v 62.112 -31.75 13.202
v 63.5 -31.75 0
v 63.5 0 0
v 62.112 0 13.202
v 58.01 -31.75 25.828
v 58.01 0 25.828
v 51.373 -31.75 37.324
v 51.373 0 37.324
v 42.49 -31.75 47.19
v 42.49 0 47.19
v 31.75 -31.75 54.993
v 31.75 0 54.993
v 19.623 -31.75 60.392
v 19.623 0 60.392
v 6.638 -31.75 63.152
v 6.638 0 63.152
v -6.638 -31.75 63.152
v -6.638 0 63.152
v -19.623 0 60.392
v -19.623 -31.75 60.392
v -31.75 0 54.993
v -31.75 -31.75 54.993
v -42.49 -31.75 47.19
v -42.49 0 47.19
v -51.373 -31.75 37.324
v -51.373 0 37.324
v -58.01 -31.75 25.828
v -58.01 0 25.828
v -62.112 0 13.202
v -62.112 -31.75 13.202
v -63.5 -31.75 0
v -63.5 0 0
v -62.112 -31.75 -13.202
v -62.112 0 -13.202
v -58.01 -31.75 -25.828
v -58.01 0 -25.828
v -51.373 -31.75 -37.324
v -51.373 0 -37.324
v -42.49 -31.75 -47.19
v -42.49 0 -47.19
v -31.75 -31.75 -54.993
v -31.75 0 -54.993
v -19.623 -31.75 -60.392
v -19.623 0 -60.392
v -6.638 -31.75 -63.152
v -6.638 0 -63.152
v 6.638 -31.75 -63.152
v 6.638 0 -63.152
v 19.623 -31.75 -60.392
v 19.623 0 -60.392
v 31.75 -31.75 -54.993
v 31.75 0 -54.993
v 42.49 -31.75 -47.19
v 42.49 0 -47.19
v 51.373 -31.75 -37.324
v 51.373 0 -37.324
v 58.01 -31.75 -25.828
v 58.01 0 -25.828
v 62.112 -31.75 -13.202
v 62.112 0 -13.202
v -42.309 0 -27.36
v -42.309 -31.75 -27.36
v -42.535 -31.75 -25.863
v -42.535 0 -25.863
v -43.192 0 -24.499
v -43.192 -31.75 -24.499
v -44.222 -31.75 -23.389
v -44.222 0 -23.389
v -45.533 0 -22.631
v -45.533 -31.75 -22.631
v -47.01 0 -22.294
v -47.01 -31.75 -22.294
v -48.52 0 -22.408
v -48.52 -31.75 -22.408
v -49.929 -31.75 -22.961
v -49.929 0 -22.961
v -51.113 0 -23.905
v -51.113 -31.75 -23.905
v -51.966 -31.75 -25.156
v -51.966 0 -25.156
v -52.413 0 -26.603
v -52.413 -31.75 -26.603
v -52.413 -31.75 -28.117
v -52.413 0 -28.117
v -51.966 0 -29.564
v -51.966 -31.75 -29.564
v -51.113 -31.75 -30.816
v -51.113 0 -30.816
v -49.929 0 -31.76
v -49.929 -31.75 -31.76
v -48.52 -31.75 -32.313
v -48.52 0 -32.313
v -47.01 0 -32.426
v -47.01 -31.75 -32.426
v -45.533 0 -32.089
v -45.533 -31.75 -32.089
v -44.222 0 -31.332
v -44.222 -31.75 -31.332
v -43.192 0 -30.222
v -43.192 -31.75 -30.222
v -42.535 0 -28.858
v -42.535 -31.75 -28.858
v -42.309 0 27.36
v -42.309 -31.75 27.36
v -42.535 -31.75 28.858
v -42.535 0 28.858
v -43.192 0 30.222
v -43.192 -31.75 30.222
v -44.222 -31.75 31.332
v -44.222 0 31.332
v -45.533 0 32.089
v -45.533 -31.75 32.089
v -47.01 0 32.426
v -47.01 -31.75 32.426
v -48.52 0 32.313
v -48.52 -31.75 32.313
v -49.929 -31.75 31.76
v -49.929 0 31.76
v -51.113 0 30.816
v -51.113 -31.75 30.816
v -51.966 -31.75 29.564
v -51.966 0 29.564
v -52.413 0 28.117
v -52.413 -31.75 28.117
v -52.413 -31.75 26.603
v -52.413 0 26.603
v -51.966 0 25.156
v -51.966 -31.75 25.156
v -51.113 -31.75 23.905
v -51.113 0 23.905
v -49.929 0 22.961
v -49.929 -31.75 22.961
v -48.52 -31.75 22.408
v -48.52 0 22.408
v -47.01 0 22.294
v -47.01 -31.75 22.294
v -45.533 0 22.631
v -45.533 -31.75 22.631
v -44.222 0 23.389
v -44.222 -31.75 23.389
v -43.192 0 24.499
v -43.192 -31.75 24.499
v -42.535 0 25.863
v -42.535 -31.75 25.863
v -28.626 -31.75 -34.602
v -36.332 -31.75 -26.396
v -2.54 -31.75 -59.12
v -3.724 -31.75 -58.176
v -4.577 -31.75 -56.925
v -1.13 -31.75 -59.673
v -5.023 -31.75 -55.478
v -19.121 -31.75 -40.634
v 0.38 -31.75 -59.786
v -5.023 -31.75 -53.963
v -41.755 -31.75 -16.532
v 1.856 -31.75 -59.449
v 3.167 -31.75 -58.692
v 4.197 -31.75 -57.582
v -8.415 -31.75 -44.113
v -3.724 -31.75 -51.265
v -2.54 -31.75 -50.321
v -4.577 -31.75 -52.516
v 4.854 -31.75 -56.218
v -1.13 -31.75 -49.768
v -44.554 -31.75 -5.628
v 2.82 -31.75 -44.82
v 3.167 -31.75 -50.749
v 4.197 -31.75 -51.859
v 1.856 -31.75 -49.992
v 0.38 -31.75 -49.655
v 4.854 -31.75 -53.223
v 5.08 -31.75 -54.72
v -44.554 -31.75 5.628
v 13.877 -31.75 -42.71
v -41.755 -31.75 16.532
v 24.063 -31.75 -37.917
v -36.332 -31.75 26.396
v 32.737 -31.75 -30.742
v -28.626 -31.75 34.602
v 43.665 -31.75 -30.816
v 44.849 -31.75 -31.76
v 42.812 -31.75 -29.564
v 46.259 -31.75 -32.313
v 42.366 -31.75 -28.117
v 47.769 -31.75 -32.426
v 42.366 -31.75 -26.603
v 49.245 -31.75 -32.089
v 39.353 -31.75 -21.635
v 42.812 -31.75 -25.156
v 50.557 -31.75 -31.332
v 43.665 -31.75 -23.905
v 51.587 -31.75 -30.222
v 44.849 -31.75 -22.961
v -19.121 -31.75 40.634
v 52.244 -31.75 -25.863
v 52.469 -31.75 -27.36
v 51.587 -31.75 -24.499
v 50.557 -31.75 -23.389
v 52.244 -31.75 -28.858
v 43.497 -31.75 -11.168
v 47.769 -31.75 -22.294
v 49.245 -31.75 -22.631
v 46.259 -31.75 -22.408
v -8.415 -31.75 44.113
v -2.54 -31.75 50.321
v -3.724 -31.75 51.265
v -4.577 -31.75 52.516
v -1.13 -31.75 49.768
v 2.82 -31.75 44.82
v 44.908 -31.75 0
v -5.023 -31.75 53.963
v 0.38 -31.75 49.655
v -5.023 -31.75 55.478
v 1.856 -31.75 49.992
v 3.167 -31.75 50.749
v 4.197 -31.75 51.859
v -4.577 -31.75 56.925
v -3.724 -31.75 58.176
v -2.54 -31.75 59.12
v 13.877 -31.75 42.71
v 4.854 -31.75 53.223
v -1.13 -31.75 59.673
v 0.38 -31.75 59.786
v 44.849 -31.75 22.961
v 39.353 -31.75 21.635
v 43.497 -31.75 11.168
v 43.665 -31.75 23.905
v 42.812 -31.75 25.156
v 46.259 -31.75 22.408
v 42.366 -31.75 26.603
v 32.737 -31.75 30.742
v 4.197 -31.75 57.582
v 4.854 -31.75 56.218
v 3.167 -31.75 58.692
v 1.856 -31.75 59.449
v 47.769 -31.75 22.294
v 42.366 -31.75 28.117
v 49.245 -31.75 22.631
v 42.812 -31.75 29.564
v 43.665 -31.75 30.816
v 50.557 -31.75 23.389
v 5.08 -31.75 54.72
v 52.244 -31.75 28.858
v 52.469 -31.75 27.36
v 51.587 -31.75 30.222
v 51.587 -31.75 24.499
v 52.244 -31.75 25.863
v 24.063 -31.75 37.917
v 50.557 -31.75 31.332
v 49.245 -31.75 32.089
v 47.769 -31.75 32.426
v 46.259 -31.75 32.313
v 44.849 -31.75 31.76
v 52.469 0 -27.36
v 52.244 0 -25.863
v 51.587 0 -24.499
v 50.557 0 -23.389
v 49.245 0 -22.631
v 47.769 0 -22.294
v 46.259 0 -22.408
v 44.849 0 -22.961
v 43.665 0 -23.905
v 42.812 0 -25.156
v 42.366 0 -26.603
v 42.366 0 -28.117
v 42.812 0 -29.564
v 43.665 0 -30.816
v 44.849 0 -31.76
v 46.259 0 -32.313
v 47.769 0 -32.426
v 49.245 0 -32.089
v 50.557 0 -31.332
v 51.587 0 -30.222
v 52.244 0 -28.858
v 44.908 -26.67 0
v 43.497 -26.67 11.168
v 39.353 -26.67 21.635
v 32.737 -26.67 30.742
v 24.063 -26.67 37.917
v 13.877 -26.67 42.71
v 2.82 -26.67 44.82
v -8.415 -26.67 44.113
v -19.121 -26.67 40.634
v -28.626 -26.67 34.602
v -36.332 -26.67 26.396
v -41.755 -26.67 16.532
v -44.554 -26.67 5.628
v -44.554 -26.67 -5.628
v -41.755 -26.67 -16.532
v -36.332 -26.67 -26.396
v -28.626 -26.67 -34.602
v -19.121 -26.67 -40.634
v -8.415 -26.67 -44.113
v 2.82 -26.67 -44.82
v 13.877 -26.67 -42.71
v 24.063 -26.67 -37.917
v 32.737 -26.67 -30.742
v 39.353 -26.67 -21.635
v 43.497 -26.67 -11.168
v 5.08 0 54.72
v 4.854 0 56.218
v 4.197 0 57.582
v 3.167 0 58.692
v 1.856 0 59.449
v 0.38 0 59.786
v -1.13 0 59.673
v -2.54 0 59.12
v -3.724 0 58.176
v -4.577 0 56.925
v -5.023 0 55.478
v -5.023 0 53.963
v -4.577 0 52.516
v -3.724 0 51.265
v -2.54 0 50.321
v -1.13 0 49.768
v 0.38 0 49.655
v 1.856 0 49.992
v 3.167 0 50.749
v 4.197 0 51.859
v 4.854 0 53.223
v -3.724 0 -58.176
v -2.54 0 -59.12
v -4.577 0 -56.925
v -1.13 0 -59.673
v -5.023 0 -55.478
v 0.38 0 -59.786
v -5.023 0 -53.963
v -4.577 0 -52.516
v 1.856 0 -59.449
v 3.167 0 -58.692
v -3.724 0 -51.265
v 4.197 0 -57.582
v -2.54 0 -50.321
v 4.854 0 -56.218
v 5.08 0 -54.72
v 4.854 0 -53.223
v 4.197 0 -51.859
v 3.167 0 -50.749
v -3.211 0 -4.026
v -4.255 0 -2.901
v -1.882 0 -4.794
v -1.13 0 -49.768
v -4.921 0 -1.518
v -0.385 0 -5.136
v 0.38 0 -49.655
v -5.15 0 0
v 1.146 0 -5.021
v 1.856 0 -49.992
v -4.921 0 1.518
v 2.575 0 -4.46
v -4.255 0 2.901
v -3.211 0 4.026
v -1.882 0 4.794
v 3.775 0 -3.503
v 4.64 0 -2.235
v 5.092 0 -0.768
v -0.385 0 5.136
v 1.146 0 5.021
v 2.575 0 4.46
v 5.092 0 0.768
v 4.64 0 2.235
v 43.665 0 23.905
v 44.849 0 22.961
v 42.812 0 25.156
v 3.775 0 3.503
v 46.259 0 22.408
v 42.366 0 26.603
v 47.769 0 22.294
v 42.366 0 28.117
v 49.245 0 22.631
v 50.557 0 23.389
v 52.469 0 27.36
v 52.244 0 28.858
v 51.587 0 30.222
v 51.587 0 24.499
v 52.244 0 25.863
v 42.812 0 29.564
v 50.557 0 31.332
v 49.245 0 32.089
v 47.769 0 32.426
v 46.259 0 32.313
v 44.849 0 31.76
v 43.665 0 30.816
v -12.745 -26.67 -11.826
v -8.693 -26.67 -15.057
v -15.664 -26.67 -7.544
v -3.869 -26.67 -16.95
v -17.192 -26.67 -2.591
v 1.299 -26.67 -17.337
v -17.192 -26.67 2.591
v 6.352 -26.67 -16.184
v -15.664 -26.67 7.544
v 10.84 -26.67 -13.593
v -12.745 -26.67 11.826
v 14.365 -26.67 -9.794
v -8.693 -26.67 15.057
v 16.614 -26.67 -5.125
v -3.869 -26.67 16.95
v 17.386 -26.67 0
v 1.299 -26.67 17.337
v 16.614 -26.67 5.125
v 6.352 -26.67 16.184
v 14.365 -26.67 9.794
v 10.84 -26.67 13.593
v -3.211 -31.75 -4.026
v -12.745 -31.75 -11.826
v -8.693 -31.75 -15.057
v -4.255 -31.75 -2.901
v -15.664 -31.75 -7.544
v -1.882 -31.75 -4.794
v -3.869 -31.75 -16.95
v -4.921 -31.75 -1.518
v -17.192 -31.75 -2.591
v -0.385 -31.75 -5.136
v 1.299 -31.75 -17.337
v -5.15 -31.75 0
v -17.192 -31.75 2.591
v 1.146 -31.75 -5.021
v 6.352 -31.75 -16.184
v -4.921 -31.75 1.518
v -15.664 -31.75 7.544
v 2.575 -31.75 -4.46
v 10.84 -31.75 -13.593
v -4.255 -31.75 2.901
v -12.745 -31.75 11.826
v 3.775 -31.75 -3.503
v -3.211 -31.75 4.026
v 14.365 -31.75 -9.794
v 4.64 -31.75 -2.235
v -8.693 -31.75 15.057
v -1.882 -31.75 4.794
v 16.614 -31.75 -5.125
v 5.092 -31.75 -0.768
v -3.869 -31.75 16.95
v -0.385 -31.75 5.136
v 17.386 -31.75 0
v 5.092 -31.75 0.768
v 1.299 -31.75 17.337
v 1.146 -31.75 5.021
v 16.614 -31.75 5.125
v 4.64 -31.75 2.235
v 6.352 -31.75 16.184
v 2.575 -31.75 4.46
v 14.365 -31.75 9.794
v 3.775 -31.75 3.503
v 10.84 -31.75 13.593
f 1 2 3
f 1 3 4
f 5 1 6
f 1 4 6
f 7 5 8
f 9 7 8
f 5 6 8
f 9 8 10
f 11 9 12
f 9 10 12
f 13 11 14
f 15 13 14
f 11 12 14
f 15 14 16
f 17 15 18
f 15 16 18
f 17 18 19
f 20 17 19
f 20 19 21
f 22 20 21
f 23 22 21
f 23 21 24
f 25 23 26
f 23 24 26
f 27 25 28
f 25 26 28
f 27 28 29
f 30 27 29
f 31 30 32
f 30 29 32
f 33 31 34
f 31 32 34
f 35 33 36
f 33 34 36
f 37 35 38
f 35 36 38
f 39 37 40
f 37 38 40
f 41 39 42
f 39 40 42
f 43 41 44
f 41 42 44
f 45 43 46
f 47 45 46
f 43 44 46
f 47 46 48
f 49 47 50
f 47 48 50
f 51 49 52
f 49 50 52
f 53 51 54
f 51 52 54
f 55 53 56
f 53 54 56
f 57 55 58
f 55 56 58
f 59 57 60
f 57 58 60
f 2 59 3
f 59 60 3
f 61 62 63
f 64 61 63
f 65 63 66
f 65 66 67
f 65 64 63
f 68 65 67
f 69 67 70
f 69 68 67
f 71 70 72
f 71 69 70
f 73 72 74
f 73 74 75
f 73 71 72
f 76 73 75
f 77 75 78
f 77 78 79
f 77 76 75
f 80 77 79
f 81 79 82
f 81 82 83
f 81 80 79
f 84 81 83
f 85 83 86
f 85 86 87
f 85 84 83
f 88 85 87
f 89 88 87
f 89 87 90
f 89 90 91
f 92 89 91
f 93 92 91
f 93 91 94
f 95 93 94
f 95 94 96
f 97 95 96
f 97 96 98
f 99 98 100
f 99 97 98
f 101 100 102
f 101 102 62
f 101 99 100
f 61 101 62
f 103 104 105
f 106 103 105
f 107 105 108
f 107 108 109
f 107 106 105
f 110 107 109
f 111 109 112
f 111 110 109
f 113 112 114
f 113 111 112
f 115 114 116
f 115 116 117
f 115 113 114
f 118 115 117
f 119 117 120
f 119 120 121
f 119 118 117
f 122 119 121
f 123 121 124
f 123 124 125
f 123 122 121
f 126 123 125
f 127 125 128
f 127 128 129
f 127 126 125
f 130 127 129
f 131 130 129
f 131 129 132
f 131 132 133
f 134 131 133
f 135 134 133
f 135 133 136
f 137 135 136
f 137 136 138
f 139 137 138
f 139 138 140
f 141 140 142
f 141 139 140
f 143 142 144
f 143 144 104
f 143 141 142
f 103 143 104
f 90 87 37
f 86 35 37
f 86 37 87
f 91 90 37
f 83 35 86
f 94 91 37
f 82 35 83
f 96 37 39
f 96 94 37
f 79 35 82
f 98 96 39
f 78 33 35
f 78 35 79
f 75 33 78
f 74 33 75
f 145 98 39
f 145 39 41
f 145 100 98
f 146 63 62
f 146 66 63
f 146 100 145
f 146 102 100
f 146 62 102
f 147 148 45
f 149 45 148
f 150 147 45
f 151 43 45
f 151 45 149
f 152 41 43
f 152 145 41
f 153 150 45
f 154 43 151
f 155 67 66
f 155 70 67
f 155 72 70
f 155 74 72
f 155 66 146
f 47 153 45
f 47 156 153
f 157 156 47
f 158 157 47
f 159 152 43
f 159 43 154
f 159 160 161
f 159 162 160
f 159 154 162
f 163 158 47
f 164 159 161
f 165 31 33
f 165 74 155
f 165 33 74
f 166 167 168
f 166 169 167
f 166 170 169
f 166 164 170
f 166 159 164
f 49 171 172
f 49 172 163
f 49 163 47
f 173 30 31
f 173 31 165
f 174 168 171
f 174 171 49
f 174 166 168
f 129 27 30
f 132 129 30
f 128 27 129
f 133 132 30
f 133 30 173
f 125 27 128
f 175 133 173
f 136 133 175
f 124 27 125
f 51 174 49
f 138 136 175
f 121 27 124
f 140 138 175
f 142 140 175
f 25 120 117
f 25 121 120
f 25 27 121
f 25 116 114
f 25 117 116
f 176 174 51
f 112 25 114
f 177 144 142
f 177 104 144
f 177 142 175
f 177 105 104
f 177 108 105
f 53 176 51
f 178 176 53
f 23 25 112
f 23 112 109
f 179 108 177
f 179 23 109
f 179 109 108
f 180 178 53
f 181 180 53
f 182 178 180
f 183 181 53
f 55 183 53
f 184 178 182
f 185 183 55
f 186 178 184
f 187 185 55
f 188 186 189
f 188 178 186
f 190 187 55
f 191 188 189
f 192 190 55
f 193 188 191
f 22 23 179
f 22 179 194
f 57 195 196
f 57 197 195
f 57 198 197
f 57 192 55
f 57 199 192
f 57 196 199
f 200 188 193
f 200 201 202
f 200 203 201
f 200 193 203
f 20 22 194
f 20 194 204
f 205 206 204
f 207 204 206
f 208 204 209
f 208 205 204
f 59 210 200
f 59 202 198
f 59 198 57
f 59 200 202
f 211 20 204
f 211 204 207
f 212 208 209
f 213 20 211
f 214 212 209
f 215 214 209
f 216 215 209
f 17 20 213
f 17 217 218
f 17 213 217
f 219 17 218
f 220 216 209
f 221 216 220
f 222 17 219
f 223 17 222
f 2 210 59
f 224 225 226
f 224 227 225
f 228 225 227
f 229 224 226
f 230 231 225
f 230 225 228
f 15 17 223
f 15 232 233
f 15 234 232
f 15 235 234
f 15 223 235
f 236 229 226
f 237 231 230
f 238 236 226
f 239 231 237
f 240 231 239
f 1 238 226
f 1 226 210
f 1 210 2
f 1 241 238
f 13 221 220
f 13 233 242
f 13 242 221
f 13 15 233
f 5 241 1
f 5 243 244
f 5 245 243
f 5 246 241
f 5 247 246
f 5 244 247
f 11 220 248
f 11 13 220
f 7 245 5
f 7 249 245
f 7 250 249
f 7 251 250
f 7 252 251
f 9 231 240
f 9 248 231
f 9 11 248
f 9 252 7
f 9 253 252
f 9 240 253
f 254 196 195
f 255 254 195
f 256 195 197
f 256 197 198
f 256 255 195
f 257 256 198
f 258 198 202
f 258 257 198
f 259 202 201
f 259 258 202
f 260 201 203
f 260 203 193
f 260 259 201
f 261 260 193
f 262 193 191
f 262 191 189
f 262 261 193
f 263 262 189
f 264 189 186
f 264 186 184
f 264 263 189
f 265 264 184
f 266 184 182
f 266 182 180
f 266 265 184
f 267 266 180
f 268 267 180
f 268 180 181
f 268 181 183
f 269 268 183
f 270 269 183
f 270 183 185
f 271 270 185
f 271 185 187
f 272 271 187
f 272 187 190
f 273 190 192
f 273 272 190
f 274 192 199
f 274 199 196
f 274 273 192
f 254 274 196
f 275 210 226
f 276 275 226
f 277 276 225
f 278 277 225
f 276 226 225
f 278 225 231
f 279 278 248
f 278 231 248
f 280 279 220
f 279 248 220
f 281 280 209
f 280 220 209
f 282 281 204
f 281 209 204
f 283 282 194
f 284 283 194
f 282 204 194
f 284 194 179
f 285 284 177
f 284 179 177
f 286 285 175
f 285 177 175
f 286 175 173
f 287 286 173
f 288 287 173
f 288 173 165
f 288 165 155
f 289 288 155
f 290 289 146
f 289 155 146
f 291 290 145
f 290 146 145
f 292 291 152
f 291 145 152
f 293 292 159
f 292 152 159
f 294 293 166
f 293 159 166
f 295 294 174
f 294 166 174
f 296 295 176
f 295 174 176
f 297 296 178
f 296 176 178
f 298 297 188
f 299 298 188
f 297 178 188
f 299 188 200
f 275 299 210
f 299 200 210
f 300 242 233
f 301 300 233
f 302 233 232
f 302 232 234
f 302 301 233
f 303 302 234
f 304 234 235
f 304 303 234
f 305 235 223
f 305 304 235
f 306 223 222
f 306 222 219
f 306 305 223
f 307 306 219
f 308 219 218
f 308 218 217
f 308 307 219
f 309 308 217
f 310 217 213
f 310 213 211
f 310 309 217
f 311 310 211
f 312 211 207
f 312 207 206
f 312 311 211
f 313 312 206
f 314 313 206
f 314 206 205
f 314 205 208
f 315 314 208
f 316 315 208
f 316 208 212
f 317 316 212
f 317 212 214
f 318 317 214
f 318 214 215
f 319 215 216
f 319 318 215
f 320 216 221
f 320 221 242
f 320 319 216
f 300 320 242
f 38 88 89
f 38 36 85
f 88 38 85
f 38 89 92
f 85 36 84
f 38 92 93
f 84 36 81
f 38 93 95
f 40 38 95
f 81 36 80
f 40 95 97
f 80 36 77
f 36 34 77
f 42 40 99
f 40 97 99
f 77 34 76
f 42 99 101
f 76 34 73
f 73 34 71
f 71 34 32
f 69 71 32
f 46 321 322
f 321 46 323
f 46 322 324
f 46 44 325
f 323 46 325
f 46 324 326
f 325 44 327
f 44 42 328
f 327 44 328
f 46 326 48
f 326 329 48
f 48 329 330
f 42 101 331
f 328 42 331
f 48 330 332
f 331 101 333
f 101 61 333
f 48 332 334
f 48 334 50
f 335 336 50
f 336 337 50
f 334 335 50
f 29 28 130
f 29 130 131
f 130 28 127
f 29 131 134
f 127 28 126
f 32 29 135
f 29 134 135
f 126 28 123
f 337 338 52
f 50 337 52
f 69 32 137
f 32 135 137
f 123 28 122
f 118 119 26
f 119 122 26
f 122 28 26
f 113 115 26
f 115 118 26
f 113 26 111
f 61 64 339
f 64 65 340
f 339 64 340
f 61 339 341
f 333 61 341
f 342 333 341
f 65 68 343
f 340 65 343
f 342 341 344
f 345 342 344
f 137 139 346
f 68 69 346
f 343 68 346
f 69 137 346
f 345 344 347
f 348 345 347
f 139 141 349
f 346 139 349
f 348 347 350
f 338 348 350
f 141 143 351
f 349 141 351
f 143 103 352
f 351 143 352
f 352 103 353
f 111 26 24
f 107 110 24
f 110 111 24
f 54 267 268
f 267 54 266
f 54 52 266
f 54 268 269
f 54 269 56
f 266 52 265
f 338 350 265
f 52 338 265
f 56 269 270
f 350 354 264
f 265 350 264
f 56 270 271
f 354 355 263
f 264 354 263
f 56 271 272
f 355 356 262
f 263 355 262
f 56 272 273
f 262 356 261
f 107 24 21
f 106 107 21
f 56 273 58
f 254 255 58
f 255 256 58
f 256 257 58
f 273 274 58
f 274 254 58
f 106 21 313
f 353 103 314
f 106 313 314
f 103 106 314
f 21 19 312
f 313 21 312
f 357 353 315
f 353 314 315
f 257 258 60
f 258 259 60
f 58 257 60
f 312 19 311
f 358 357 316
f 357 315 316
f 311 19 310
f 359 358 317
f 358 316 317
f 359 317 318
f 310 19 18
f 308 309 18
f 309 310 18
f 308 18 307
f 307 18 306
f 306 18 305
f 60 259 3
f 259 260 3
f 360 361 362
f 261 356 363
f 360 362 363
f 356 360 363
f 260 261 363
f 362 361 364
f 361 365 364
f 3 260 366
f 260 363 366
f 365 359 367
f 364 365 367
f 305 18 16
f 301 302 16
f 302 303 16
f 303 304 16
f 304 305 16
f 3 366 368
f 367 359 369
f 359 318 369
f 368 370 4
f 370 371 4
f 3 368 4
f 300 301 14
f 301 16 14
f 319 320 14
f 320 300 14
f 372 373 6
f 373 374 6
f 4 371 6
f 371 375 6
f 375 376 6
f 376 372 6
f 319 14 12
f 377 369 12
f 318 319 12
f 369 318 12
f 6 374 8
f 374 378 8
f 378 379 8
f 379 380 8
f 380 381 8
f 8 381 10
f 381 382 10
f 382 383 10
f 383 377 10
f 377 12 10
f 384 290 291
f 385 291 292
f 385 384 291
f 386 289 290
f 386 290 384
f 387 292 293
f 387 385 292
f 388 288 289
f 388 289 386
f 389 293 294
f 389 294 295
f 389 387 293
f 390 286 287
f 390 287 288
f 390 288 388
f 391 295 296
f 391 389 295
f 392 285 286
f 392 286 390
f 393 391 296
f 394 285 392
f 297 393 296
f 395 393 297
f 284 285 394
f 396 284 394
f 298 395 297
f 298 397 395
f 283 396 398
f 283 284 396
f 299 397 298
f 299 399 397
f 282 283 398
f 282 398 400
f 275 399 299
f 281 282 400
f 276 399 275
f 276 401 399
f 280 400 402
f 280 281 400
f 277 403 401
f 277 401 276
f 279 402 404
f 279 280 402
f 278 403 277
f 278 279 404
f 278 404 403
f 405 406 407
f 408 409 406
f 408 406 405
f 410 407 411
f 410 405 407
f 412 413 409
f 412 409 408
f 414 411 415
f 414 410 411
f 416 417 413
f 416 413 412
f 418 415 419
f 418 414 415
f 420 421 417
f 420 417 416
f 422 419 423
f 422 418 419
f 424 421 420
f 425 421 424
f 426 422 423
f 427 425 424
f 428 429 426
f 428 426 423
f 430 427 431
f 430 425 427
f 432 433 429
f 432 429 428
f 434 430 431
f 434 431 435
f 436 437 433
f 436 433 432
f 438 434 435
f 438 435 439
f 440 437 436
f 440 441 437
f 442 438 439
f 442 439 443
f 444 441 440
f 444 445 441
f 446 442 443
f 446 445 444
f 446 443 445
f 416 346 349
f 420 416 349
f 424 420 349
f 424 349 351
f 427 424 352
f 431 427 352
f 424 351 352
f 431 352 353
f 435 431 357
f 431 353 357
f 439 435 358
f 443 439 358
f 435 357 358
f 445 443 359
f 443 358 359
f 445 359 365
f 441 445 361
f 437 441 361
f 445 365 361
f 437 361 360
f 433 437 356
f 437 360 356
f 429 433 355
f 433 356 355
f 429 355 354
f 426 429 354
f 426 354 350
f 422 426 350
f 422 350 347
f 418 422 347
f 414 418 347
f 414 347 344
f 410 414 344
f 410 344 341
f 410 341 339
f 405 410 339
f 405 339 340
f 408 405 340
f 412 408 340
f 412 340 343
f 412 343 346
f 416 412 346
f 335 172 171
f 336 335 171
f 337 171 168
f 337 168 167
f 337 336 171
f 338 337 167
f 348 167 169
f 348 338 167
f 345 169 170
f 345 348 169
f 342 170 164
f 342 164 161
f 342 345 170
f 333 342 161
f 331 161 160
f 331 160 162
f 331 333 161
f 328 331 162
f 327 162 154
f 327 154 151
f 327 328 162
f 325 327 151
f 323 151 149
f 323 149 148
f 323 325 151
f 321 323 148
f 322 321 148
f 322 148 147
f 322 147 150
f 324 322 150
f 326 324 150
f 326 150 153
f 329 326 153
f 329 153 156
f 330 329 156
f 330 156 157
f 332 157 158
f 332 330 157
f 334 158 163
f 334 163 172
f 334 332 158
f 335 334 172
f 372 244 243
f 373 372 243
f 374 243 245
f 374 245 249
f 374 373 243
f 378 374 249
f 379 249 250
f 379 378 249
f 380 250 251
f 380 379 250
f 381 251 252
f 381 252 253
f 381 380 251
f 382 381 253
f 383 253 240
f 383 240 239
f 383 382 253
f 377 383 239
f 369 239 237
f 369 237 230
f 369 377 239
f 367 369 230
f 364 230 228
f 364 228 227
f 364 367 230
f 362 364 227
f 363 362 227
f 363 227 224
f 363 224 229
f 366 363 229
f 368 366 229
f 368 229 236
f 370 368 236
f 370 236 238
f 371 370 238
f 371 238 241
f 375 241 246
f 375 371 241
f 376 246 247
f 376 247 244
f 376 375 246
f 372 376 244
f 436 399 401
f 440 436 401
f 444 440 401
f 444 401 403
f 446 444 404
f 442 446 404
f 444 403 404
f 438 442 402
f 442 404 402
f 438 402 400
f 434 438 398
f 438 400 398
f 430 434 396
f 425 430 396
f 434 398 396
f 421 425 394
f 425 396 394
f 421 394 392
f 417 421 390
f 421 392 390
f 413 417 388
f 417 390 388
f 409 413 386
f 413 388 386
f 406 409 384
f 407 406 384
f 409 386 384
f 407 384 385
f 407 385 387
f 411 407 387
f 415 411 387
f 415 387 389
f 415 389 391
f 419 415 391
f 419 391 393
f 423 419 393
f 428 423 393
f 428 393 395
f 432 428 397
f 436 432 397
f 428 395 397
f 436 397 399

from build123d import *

# Parameters (mm, degrees)
F0_R     = 63.5
F0_R_2   = 5.08
F1_DEPTH = 31.75
F2_R     = 44.9082532623
F3_DEPTH = 5.08
F4_R     = 17.386039325
F5_DEPTH = 5.08
F7_D     = 10.3
F7_DEPTH = 81.4578
F7_TIP   = 3.094432188


with BuildPart() as f1:
    # F0 (on Front) → F1 (new body)
    with BuildSketch(Plane.XZ):
        Circle(F0_R)
        with Locations((-47.3893386877, -27.3602474481)):
            Circle(F0_R_2, mode=Mode.SUBTRACT)
        with Locations((0, -54.7204948962)):
            Circle(F0_R_2, mode=Mode.SUBTRACT)
        with Locations((47.3893386877, -27.3602474481)):
            Circle(F0_R_2, mode=Mode.SUBTRACT)
        with Locations((-47.3893386877, 27.3602474481)):
            Circle(F0_R_2, mode=Mode.SUBTRACT)
        with Locations((47.3893386877, 27.3602474481)):
            Circle(F0_R_2, mode=Mode.SUBTRACT)
        with Locations((0, 54.7204948962)):
            Circle(F0_R_2, mode=Mode.SUBTRACT)
    extrude(amount=F1_DEPTH)

    # F2 (on face) → F3 (cut)
    with BuildSketch(Plane.XZ.offset(31.75)):
        Circle(F2_R)
    extrude(amount=-F3_DEPTH, mode=Mode.SUBTRACT)

    # F4 (on face) → F5 (join)
    with BuildSketch(Plane.XZ.offset(26.67)):
        Circle(F4_R)
    extrude(amount=F5_DEPTH)

    # F7
    with Locations(Plane.XZ.offset(31.75)):
        with Locations((0, 0)):
            Hole(F7_D / 2, depth=F7_DEPTH)
            with Locations((0, 0, -(F7_DEPTH + F7_TIP / 2))):  # 118° drill point
                Cone(0, F7_D / 2, F7_TIP, mode=Mode.SUBTRACT)


solid = f1.part
